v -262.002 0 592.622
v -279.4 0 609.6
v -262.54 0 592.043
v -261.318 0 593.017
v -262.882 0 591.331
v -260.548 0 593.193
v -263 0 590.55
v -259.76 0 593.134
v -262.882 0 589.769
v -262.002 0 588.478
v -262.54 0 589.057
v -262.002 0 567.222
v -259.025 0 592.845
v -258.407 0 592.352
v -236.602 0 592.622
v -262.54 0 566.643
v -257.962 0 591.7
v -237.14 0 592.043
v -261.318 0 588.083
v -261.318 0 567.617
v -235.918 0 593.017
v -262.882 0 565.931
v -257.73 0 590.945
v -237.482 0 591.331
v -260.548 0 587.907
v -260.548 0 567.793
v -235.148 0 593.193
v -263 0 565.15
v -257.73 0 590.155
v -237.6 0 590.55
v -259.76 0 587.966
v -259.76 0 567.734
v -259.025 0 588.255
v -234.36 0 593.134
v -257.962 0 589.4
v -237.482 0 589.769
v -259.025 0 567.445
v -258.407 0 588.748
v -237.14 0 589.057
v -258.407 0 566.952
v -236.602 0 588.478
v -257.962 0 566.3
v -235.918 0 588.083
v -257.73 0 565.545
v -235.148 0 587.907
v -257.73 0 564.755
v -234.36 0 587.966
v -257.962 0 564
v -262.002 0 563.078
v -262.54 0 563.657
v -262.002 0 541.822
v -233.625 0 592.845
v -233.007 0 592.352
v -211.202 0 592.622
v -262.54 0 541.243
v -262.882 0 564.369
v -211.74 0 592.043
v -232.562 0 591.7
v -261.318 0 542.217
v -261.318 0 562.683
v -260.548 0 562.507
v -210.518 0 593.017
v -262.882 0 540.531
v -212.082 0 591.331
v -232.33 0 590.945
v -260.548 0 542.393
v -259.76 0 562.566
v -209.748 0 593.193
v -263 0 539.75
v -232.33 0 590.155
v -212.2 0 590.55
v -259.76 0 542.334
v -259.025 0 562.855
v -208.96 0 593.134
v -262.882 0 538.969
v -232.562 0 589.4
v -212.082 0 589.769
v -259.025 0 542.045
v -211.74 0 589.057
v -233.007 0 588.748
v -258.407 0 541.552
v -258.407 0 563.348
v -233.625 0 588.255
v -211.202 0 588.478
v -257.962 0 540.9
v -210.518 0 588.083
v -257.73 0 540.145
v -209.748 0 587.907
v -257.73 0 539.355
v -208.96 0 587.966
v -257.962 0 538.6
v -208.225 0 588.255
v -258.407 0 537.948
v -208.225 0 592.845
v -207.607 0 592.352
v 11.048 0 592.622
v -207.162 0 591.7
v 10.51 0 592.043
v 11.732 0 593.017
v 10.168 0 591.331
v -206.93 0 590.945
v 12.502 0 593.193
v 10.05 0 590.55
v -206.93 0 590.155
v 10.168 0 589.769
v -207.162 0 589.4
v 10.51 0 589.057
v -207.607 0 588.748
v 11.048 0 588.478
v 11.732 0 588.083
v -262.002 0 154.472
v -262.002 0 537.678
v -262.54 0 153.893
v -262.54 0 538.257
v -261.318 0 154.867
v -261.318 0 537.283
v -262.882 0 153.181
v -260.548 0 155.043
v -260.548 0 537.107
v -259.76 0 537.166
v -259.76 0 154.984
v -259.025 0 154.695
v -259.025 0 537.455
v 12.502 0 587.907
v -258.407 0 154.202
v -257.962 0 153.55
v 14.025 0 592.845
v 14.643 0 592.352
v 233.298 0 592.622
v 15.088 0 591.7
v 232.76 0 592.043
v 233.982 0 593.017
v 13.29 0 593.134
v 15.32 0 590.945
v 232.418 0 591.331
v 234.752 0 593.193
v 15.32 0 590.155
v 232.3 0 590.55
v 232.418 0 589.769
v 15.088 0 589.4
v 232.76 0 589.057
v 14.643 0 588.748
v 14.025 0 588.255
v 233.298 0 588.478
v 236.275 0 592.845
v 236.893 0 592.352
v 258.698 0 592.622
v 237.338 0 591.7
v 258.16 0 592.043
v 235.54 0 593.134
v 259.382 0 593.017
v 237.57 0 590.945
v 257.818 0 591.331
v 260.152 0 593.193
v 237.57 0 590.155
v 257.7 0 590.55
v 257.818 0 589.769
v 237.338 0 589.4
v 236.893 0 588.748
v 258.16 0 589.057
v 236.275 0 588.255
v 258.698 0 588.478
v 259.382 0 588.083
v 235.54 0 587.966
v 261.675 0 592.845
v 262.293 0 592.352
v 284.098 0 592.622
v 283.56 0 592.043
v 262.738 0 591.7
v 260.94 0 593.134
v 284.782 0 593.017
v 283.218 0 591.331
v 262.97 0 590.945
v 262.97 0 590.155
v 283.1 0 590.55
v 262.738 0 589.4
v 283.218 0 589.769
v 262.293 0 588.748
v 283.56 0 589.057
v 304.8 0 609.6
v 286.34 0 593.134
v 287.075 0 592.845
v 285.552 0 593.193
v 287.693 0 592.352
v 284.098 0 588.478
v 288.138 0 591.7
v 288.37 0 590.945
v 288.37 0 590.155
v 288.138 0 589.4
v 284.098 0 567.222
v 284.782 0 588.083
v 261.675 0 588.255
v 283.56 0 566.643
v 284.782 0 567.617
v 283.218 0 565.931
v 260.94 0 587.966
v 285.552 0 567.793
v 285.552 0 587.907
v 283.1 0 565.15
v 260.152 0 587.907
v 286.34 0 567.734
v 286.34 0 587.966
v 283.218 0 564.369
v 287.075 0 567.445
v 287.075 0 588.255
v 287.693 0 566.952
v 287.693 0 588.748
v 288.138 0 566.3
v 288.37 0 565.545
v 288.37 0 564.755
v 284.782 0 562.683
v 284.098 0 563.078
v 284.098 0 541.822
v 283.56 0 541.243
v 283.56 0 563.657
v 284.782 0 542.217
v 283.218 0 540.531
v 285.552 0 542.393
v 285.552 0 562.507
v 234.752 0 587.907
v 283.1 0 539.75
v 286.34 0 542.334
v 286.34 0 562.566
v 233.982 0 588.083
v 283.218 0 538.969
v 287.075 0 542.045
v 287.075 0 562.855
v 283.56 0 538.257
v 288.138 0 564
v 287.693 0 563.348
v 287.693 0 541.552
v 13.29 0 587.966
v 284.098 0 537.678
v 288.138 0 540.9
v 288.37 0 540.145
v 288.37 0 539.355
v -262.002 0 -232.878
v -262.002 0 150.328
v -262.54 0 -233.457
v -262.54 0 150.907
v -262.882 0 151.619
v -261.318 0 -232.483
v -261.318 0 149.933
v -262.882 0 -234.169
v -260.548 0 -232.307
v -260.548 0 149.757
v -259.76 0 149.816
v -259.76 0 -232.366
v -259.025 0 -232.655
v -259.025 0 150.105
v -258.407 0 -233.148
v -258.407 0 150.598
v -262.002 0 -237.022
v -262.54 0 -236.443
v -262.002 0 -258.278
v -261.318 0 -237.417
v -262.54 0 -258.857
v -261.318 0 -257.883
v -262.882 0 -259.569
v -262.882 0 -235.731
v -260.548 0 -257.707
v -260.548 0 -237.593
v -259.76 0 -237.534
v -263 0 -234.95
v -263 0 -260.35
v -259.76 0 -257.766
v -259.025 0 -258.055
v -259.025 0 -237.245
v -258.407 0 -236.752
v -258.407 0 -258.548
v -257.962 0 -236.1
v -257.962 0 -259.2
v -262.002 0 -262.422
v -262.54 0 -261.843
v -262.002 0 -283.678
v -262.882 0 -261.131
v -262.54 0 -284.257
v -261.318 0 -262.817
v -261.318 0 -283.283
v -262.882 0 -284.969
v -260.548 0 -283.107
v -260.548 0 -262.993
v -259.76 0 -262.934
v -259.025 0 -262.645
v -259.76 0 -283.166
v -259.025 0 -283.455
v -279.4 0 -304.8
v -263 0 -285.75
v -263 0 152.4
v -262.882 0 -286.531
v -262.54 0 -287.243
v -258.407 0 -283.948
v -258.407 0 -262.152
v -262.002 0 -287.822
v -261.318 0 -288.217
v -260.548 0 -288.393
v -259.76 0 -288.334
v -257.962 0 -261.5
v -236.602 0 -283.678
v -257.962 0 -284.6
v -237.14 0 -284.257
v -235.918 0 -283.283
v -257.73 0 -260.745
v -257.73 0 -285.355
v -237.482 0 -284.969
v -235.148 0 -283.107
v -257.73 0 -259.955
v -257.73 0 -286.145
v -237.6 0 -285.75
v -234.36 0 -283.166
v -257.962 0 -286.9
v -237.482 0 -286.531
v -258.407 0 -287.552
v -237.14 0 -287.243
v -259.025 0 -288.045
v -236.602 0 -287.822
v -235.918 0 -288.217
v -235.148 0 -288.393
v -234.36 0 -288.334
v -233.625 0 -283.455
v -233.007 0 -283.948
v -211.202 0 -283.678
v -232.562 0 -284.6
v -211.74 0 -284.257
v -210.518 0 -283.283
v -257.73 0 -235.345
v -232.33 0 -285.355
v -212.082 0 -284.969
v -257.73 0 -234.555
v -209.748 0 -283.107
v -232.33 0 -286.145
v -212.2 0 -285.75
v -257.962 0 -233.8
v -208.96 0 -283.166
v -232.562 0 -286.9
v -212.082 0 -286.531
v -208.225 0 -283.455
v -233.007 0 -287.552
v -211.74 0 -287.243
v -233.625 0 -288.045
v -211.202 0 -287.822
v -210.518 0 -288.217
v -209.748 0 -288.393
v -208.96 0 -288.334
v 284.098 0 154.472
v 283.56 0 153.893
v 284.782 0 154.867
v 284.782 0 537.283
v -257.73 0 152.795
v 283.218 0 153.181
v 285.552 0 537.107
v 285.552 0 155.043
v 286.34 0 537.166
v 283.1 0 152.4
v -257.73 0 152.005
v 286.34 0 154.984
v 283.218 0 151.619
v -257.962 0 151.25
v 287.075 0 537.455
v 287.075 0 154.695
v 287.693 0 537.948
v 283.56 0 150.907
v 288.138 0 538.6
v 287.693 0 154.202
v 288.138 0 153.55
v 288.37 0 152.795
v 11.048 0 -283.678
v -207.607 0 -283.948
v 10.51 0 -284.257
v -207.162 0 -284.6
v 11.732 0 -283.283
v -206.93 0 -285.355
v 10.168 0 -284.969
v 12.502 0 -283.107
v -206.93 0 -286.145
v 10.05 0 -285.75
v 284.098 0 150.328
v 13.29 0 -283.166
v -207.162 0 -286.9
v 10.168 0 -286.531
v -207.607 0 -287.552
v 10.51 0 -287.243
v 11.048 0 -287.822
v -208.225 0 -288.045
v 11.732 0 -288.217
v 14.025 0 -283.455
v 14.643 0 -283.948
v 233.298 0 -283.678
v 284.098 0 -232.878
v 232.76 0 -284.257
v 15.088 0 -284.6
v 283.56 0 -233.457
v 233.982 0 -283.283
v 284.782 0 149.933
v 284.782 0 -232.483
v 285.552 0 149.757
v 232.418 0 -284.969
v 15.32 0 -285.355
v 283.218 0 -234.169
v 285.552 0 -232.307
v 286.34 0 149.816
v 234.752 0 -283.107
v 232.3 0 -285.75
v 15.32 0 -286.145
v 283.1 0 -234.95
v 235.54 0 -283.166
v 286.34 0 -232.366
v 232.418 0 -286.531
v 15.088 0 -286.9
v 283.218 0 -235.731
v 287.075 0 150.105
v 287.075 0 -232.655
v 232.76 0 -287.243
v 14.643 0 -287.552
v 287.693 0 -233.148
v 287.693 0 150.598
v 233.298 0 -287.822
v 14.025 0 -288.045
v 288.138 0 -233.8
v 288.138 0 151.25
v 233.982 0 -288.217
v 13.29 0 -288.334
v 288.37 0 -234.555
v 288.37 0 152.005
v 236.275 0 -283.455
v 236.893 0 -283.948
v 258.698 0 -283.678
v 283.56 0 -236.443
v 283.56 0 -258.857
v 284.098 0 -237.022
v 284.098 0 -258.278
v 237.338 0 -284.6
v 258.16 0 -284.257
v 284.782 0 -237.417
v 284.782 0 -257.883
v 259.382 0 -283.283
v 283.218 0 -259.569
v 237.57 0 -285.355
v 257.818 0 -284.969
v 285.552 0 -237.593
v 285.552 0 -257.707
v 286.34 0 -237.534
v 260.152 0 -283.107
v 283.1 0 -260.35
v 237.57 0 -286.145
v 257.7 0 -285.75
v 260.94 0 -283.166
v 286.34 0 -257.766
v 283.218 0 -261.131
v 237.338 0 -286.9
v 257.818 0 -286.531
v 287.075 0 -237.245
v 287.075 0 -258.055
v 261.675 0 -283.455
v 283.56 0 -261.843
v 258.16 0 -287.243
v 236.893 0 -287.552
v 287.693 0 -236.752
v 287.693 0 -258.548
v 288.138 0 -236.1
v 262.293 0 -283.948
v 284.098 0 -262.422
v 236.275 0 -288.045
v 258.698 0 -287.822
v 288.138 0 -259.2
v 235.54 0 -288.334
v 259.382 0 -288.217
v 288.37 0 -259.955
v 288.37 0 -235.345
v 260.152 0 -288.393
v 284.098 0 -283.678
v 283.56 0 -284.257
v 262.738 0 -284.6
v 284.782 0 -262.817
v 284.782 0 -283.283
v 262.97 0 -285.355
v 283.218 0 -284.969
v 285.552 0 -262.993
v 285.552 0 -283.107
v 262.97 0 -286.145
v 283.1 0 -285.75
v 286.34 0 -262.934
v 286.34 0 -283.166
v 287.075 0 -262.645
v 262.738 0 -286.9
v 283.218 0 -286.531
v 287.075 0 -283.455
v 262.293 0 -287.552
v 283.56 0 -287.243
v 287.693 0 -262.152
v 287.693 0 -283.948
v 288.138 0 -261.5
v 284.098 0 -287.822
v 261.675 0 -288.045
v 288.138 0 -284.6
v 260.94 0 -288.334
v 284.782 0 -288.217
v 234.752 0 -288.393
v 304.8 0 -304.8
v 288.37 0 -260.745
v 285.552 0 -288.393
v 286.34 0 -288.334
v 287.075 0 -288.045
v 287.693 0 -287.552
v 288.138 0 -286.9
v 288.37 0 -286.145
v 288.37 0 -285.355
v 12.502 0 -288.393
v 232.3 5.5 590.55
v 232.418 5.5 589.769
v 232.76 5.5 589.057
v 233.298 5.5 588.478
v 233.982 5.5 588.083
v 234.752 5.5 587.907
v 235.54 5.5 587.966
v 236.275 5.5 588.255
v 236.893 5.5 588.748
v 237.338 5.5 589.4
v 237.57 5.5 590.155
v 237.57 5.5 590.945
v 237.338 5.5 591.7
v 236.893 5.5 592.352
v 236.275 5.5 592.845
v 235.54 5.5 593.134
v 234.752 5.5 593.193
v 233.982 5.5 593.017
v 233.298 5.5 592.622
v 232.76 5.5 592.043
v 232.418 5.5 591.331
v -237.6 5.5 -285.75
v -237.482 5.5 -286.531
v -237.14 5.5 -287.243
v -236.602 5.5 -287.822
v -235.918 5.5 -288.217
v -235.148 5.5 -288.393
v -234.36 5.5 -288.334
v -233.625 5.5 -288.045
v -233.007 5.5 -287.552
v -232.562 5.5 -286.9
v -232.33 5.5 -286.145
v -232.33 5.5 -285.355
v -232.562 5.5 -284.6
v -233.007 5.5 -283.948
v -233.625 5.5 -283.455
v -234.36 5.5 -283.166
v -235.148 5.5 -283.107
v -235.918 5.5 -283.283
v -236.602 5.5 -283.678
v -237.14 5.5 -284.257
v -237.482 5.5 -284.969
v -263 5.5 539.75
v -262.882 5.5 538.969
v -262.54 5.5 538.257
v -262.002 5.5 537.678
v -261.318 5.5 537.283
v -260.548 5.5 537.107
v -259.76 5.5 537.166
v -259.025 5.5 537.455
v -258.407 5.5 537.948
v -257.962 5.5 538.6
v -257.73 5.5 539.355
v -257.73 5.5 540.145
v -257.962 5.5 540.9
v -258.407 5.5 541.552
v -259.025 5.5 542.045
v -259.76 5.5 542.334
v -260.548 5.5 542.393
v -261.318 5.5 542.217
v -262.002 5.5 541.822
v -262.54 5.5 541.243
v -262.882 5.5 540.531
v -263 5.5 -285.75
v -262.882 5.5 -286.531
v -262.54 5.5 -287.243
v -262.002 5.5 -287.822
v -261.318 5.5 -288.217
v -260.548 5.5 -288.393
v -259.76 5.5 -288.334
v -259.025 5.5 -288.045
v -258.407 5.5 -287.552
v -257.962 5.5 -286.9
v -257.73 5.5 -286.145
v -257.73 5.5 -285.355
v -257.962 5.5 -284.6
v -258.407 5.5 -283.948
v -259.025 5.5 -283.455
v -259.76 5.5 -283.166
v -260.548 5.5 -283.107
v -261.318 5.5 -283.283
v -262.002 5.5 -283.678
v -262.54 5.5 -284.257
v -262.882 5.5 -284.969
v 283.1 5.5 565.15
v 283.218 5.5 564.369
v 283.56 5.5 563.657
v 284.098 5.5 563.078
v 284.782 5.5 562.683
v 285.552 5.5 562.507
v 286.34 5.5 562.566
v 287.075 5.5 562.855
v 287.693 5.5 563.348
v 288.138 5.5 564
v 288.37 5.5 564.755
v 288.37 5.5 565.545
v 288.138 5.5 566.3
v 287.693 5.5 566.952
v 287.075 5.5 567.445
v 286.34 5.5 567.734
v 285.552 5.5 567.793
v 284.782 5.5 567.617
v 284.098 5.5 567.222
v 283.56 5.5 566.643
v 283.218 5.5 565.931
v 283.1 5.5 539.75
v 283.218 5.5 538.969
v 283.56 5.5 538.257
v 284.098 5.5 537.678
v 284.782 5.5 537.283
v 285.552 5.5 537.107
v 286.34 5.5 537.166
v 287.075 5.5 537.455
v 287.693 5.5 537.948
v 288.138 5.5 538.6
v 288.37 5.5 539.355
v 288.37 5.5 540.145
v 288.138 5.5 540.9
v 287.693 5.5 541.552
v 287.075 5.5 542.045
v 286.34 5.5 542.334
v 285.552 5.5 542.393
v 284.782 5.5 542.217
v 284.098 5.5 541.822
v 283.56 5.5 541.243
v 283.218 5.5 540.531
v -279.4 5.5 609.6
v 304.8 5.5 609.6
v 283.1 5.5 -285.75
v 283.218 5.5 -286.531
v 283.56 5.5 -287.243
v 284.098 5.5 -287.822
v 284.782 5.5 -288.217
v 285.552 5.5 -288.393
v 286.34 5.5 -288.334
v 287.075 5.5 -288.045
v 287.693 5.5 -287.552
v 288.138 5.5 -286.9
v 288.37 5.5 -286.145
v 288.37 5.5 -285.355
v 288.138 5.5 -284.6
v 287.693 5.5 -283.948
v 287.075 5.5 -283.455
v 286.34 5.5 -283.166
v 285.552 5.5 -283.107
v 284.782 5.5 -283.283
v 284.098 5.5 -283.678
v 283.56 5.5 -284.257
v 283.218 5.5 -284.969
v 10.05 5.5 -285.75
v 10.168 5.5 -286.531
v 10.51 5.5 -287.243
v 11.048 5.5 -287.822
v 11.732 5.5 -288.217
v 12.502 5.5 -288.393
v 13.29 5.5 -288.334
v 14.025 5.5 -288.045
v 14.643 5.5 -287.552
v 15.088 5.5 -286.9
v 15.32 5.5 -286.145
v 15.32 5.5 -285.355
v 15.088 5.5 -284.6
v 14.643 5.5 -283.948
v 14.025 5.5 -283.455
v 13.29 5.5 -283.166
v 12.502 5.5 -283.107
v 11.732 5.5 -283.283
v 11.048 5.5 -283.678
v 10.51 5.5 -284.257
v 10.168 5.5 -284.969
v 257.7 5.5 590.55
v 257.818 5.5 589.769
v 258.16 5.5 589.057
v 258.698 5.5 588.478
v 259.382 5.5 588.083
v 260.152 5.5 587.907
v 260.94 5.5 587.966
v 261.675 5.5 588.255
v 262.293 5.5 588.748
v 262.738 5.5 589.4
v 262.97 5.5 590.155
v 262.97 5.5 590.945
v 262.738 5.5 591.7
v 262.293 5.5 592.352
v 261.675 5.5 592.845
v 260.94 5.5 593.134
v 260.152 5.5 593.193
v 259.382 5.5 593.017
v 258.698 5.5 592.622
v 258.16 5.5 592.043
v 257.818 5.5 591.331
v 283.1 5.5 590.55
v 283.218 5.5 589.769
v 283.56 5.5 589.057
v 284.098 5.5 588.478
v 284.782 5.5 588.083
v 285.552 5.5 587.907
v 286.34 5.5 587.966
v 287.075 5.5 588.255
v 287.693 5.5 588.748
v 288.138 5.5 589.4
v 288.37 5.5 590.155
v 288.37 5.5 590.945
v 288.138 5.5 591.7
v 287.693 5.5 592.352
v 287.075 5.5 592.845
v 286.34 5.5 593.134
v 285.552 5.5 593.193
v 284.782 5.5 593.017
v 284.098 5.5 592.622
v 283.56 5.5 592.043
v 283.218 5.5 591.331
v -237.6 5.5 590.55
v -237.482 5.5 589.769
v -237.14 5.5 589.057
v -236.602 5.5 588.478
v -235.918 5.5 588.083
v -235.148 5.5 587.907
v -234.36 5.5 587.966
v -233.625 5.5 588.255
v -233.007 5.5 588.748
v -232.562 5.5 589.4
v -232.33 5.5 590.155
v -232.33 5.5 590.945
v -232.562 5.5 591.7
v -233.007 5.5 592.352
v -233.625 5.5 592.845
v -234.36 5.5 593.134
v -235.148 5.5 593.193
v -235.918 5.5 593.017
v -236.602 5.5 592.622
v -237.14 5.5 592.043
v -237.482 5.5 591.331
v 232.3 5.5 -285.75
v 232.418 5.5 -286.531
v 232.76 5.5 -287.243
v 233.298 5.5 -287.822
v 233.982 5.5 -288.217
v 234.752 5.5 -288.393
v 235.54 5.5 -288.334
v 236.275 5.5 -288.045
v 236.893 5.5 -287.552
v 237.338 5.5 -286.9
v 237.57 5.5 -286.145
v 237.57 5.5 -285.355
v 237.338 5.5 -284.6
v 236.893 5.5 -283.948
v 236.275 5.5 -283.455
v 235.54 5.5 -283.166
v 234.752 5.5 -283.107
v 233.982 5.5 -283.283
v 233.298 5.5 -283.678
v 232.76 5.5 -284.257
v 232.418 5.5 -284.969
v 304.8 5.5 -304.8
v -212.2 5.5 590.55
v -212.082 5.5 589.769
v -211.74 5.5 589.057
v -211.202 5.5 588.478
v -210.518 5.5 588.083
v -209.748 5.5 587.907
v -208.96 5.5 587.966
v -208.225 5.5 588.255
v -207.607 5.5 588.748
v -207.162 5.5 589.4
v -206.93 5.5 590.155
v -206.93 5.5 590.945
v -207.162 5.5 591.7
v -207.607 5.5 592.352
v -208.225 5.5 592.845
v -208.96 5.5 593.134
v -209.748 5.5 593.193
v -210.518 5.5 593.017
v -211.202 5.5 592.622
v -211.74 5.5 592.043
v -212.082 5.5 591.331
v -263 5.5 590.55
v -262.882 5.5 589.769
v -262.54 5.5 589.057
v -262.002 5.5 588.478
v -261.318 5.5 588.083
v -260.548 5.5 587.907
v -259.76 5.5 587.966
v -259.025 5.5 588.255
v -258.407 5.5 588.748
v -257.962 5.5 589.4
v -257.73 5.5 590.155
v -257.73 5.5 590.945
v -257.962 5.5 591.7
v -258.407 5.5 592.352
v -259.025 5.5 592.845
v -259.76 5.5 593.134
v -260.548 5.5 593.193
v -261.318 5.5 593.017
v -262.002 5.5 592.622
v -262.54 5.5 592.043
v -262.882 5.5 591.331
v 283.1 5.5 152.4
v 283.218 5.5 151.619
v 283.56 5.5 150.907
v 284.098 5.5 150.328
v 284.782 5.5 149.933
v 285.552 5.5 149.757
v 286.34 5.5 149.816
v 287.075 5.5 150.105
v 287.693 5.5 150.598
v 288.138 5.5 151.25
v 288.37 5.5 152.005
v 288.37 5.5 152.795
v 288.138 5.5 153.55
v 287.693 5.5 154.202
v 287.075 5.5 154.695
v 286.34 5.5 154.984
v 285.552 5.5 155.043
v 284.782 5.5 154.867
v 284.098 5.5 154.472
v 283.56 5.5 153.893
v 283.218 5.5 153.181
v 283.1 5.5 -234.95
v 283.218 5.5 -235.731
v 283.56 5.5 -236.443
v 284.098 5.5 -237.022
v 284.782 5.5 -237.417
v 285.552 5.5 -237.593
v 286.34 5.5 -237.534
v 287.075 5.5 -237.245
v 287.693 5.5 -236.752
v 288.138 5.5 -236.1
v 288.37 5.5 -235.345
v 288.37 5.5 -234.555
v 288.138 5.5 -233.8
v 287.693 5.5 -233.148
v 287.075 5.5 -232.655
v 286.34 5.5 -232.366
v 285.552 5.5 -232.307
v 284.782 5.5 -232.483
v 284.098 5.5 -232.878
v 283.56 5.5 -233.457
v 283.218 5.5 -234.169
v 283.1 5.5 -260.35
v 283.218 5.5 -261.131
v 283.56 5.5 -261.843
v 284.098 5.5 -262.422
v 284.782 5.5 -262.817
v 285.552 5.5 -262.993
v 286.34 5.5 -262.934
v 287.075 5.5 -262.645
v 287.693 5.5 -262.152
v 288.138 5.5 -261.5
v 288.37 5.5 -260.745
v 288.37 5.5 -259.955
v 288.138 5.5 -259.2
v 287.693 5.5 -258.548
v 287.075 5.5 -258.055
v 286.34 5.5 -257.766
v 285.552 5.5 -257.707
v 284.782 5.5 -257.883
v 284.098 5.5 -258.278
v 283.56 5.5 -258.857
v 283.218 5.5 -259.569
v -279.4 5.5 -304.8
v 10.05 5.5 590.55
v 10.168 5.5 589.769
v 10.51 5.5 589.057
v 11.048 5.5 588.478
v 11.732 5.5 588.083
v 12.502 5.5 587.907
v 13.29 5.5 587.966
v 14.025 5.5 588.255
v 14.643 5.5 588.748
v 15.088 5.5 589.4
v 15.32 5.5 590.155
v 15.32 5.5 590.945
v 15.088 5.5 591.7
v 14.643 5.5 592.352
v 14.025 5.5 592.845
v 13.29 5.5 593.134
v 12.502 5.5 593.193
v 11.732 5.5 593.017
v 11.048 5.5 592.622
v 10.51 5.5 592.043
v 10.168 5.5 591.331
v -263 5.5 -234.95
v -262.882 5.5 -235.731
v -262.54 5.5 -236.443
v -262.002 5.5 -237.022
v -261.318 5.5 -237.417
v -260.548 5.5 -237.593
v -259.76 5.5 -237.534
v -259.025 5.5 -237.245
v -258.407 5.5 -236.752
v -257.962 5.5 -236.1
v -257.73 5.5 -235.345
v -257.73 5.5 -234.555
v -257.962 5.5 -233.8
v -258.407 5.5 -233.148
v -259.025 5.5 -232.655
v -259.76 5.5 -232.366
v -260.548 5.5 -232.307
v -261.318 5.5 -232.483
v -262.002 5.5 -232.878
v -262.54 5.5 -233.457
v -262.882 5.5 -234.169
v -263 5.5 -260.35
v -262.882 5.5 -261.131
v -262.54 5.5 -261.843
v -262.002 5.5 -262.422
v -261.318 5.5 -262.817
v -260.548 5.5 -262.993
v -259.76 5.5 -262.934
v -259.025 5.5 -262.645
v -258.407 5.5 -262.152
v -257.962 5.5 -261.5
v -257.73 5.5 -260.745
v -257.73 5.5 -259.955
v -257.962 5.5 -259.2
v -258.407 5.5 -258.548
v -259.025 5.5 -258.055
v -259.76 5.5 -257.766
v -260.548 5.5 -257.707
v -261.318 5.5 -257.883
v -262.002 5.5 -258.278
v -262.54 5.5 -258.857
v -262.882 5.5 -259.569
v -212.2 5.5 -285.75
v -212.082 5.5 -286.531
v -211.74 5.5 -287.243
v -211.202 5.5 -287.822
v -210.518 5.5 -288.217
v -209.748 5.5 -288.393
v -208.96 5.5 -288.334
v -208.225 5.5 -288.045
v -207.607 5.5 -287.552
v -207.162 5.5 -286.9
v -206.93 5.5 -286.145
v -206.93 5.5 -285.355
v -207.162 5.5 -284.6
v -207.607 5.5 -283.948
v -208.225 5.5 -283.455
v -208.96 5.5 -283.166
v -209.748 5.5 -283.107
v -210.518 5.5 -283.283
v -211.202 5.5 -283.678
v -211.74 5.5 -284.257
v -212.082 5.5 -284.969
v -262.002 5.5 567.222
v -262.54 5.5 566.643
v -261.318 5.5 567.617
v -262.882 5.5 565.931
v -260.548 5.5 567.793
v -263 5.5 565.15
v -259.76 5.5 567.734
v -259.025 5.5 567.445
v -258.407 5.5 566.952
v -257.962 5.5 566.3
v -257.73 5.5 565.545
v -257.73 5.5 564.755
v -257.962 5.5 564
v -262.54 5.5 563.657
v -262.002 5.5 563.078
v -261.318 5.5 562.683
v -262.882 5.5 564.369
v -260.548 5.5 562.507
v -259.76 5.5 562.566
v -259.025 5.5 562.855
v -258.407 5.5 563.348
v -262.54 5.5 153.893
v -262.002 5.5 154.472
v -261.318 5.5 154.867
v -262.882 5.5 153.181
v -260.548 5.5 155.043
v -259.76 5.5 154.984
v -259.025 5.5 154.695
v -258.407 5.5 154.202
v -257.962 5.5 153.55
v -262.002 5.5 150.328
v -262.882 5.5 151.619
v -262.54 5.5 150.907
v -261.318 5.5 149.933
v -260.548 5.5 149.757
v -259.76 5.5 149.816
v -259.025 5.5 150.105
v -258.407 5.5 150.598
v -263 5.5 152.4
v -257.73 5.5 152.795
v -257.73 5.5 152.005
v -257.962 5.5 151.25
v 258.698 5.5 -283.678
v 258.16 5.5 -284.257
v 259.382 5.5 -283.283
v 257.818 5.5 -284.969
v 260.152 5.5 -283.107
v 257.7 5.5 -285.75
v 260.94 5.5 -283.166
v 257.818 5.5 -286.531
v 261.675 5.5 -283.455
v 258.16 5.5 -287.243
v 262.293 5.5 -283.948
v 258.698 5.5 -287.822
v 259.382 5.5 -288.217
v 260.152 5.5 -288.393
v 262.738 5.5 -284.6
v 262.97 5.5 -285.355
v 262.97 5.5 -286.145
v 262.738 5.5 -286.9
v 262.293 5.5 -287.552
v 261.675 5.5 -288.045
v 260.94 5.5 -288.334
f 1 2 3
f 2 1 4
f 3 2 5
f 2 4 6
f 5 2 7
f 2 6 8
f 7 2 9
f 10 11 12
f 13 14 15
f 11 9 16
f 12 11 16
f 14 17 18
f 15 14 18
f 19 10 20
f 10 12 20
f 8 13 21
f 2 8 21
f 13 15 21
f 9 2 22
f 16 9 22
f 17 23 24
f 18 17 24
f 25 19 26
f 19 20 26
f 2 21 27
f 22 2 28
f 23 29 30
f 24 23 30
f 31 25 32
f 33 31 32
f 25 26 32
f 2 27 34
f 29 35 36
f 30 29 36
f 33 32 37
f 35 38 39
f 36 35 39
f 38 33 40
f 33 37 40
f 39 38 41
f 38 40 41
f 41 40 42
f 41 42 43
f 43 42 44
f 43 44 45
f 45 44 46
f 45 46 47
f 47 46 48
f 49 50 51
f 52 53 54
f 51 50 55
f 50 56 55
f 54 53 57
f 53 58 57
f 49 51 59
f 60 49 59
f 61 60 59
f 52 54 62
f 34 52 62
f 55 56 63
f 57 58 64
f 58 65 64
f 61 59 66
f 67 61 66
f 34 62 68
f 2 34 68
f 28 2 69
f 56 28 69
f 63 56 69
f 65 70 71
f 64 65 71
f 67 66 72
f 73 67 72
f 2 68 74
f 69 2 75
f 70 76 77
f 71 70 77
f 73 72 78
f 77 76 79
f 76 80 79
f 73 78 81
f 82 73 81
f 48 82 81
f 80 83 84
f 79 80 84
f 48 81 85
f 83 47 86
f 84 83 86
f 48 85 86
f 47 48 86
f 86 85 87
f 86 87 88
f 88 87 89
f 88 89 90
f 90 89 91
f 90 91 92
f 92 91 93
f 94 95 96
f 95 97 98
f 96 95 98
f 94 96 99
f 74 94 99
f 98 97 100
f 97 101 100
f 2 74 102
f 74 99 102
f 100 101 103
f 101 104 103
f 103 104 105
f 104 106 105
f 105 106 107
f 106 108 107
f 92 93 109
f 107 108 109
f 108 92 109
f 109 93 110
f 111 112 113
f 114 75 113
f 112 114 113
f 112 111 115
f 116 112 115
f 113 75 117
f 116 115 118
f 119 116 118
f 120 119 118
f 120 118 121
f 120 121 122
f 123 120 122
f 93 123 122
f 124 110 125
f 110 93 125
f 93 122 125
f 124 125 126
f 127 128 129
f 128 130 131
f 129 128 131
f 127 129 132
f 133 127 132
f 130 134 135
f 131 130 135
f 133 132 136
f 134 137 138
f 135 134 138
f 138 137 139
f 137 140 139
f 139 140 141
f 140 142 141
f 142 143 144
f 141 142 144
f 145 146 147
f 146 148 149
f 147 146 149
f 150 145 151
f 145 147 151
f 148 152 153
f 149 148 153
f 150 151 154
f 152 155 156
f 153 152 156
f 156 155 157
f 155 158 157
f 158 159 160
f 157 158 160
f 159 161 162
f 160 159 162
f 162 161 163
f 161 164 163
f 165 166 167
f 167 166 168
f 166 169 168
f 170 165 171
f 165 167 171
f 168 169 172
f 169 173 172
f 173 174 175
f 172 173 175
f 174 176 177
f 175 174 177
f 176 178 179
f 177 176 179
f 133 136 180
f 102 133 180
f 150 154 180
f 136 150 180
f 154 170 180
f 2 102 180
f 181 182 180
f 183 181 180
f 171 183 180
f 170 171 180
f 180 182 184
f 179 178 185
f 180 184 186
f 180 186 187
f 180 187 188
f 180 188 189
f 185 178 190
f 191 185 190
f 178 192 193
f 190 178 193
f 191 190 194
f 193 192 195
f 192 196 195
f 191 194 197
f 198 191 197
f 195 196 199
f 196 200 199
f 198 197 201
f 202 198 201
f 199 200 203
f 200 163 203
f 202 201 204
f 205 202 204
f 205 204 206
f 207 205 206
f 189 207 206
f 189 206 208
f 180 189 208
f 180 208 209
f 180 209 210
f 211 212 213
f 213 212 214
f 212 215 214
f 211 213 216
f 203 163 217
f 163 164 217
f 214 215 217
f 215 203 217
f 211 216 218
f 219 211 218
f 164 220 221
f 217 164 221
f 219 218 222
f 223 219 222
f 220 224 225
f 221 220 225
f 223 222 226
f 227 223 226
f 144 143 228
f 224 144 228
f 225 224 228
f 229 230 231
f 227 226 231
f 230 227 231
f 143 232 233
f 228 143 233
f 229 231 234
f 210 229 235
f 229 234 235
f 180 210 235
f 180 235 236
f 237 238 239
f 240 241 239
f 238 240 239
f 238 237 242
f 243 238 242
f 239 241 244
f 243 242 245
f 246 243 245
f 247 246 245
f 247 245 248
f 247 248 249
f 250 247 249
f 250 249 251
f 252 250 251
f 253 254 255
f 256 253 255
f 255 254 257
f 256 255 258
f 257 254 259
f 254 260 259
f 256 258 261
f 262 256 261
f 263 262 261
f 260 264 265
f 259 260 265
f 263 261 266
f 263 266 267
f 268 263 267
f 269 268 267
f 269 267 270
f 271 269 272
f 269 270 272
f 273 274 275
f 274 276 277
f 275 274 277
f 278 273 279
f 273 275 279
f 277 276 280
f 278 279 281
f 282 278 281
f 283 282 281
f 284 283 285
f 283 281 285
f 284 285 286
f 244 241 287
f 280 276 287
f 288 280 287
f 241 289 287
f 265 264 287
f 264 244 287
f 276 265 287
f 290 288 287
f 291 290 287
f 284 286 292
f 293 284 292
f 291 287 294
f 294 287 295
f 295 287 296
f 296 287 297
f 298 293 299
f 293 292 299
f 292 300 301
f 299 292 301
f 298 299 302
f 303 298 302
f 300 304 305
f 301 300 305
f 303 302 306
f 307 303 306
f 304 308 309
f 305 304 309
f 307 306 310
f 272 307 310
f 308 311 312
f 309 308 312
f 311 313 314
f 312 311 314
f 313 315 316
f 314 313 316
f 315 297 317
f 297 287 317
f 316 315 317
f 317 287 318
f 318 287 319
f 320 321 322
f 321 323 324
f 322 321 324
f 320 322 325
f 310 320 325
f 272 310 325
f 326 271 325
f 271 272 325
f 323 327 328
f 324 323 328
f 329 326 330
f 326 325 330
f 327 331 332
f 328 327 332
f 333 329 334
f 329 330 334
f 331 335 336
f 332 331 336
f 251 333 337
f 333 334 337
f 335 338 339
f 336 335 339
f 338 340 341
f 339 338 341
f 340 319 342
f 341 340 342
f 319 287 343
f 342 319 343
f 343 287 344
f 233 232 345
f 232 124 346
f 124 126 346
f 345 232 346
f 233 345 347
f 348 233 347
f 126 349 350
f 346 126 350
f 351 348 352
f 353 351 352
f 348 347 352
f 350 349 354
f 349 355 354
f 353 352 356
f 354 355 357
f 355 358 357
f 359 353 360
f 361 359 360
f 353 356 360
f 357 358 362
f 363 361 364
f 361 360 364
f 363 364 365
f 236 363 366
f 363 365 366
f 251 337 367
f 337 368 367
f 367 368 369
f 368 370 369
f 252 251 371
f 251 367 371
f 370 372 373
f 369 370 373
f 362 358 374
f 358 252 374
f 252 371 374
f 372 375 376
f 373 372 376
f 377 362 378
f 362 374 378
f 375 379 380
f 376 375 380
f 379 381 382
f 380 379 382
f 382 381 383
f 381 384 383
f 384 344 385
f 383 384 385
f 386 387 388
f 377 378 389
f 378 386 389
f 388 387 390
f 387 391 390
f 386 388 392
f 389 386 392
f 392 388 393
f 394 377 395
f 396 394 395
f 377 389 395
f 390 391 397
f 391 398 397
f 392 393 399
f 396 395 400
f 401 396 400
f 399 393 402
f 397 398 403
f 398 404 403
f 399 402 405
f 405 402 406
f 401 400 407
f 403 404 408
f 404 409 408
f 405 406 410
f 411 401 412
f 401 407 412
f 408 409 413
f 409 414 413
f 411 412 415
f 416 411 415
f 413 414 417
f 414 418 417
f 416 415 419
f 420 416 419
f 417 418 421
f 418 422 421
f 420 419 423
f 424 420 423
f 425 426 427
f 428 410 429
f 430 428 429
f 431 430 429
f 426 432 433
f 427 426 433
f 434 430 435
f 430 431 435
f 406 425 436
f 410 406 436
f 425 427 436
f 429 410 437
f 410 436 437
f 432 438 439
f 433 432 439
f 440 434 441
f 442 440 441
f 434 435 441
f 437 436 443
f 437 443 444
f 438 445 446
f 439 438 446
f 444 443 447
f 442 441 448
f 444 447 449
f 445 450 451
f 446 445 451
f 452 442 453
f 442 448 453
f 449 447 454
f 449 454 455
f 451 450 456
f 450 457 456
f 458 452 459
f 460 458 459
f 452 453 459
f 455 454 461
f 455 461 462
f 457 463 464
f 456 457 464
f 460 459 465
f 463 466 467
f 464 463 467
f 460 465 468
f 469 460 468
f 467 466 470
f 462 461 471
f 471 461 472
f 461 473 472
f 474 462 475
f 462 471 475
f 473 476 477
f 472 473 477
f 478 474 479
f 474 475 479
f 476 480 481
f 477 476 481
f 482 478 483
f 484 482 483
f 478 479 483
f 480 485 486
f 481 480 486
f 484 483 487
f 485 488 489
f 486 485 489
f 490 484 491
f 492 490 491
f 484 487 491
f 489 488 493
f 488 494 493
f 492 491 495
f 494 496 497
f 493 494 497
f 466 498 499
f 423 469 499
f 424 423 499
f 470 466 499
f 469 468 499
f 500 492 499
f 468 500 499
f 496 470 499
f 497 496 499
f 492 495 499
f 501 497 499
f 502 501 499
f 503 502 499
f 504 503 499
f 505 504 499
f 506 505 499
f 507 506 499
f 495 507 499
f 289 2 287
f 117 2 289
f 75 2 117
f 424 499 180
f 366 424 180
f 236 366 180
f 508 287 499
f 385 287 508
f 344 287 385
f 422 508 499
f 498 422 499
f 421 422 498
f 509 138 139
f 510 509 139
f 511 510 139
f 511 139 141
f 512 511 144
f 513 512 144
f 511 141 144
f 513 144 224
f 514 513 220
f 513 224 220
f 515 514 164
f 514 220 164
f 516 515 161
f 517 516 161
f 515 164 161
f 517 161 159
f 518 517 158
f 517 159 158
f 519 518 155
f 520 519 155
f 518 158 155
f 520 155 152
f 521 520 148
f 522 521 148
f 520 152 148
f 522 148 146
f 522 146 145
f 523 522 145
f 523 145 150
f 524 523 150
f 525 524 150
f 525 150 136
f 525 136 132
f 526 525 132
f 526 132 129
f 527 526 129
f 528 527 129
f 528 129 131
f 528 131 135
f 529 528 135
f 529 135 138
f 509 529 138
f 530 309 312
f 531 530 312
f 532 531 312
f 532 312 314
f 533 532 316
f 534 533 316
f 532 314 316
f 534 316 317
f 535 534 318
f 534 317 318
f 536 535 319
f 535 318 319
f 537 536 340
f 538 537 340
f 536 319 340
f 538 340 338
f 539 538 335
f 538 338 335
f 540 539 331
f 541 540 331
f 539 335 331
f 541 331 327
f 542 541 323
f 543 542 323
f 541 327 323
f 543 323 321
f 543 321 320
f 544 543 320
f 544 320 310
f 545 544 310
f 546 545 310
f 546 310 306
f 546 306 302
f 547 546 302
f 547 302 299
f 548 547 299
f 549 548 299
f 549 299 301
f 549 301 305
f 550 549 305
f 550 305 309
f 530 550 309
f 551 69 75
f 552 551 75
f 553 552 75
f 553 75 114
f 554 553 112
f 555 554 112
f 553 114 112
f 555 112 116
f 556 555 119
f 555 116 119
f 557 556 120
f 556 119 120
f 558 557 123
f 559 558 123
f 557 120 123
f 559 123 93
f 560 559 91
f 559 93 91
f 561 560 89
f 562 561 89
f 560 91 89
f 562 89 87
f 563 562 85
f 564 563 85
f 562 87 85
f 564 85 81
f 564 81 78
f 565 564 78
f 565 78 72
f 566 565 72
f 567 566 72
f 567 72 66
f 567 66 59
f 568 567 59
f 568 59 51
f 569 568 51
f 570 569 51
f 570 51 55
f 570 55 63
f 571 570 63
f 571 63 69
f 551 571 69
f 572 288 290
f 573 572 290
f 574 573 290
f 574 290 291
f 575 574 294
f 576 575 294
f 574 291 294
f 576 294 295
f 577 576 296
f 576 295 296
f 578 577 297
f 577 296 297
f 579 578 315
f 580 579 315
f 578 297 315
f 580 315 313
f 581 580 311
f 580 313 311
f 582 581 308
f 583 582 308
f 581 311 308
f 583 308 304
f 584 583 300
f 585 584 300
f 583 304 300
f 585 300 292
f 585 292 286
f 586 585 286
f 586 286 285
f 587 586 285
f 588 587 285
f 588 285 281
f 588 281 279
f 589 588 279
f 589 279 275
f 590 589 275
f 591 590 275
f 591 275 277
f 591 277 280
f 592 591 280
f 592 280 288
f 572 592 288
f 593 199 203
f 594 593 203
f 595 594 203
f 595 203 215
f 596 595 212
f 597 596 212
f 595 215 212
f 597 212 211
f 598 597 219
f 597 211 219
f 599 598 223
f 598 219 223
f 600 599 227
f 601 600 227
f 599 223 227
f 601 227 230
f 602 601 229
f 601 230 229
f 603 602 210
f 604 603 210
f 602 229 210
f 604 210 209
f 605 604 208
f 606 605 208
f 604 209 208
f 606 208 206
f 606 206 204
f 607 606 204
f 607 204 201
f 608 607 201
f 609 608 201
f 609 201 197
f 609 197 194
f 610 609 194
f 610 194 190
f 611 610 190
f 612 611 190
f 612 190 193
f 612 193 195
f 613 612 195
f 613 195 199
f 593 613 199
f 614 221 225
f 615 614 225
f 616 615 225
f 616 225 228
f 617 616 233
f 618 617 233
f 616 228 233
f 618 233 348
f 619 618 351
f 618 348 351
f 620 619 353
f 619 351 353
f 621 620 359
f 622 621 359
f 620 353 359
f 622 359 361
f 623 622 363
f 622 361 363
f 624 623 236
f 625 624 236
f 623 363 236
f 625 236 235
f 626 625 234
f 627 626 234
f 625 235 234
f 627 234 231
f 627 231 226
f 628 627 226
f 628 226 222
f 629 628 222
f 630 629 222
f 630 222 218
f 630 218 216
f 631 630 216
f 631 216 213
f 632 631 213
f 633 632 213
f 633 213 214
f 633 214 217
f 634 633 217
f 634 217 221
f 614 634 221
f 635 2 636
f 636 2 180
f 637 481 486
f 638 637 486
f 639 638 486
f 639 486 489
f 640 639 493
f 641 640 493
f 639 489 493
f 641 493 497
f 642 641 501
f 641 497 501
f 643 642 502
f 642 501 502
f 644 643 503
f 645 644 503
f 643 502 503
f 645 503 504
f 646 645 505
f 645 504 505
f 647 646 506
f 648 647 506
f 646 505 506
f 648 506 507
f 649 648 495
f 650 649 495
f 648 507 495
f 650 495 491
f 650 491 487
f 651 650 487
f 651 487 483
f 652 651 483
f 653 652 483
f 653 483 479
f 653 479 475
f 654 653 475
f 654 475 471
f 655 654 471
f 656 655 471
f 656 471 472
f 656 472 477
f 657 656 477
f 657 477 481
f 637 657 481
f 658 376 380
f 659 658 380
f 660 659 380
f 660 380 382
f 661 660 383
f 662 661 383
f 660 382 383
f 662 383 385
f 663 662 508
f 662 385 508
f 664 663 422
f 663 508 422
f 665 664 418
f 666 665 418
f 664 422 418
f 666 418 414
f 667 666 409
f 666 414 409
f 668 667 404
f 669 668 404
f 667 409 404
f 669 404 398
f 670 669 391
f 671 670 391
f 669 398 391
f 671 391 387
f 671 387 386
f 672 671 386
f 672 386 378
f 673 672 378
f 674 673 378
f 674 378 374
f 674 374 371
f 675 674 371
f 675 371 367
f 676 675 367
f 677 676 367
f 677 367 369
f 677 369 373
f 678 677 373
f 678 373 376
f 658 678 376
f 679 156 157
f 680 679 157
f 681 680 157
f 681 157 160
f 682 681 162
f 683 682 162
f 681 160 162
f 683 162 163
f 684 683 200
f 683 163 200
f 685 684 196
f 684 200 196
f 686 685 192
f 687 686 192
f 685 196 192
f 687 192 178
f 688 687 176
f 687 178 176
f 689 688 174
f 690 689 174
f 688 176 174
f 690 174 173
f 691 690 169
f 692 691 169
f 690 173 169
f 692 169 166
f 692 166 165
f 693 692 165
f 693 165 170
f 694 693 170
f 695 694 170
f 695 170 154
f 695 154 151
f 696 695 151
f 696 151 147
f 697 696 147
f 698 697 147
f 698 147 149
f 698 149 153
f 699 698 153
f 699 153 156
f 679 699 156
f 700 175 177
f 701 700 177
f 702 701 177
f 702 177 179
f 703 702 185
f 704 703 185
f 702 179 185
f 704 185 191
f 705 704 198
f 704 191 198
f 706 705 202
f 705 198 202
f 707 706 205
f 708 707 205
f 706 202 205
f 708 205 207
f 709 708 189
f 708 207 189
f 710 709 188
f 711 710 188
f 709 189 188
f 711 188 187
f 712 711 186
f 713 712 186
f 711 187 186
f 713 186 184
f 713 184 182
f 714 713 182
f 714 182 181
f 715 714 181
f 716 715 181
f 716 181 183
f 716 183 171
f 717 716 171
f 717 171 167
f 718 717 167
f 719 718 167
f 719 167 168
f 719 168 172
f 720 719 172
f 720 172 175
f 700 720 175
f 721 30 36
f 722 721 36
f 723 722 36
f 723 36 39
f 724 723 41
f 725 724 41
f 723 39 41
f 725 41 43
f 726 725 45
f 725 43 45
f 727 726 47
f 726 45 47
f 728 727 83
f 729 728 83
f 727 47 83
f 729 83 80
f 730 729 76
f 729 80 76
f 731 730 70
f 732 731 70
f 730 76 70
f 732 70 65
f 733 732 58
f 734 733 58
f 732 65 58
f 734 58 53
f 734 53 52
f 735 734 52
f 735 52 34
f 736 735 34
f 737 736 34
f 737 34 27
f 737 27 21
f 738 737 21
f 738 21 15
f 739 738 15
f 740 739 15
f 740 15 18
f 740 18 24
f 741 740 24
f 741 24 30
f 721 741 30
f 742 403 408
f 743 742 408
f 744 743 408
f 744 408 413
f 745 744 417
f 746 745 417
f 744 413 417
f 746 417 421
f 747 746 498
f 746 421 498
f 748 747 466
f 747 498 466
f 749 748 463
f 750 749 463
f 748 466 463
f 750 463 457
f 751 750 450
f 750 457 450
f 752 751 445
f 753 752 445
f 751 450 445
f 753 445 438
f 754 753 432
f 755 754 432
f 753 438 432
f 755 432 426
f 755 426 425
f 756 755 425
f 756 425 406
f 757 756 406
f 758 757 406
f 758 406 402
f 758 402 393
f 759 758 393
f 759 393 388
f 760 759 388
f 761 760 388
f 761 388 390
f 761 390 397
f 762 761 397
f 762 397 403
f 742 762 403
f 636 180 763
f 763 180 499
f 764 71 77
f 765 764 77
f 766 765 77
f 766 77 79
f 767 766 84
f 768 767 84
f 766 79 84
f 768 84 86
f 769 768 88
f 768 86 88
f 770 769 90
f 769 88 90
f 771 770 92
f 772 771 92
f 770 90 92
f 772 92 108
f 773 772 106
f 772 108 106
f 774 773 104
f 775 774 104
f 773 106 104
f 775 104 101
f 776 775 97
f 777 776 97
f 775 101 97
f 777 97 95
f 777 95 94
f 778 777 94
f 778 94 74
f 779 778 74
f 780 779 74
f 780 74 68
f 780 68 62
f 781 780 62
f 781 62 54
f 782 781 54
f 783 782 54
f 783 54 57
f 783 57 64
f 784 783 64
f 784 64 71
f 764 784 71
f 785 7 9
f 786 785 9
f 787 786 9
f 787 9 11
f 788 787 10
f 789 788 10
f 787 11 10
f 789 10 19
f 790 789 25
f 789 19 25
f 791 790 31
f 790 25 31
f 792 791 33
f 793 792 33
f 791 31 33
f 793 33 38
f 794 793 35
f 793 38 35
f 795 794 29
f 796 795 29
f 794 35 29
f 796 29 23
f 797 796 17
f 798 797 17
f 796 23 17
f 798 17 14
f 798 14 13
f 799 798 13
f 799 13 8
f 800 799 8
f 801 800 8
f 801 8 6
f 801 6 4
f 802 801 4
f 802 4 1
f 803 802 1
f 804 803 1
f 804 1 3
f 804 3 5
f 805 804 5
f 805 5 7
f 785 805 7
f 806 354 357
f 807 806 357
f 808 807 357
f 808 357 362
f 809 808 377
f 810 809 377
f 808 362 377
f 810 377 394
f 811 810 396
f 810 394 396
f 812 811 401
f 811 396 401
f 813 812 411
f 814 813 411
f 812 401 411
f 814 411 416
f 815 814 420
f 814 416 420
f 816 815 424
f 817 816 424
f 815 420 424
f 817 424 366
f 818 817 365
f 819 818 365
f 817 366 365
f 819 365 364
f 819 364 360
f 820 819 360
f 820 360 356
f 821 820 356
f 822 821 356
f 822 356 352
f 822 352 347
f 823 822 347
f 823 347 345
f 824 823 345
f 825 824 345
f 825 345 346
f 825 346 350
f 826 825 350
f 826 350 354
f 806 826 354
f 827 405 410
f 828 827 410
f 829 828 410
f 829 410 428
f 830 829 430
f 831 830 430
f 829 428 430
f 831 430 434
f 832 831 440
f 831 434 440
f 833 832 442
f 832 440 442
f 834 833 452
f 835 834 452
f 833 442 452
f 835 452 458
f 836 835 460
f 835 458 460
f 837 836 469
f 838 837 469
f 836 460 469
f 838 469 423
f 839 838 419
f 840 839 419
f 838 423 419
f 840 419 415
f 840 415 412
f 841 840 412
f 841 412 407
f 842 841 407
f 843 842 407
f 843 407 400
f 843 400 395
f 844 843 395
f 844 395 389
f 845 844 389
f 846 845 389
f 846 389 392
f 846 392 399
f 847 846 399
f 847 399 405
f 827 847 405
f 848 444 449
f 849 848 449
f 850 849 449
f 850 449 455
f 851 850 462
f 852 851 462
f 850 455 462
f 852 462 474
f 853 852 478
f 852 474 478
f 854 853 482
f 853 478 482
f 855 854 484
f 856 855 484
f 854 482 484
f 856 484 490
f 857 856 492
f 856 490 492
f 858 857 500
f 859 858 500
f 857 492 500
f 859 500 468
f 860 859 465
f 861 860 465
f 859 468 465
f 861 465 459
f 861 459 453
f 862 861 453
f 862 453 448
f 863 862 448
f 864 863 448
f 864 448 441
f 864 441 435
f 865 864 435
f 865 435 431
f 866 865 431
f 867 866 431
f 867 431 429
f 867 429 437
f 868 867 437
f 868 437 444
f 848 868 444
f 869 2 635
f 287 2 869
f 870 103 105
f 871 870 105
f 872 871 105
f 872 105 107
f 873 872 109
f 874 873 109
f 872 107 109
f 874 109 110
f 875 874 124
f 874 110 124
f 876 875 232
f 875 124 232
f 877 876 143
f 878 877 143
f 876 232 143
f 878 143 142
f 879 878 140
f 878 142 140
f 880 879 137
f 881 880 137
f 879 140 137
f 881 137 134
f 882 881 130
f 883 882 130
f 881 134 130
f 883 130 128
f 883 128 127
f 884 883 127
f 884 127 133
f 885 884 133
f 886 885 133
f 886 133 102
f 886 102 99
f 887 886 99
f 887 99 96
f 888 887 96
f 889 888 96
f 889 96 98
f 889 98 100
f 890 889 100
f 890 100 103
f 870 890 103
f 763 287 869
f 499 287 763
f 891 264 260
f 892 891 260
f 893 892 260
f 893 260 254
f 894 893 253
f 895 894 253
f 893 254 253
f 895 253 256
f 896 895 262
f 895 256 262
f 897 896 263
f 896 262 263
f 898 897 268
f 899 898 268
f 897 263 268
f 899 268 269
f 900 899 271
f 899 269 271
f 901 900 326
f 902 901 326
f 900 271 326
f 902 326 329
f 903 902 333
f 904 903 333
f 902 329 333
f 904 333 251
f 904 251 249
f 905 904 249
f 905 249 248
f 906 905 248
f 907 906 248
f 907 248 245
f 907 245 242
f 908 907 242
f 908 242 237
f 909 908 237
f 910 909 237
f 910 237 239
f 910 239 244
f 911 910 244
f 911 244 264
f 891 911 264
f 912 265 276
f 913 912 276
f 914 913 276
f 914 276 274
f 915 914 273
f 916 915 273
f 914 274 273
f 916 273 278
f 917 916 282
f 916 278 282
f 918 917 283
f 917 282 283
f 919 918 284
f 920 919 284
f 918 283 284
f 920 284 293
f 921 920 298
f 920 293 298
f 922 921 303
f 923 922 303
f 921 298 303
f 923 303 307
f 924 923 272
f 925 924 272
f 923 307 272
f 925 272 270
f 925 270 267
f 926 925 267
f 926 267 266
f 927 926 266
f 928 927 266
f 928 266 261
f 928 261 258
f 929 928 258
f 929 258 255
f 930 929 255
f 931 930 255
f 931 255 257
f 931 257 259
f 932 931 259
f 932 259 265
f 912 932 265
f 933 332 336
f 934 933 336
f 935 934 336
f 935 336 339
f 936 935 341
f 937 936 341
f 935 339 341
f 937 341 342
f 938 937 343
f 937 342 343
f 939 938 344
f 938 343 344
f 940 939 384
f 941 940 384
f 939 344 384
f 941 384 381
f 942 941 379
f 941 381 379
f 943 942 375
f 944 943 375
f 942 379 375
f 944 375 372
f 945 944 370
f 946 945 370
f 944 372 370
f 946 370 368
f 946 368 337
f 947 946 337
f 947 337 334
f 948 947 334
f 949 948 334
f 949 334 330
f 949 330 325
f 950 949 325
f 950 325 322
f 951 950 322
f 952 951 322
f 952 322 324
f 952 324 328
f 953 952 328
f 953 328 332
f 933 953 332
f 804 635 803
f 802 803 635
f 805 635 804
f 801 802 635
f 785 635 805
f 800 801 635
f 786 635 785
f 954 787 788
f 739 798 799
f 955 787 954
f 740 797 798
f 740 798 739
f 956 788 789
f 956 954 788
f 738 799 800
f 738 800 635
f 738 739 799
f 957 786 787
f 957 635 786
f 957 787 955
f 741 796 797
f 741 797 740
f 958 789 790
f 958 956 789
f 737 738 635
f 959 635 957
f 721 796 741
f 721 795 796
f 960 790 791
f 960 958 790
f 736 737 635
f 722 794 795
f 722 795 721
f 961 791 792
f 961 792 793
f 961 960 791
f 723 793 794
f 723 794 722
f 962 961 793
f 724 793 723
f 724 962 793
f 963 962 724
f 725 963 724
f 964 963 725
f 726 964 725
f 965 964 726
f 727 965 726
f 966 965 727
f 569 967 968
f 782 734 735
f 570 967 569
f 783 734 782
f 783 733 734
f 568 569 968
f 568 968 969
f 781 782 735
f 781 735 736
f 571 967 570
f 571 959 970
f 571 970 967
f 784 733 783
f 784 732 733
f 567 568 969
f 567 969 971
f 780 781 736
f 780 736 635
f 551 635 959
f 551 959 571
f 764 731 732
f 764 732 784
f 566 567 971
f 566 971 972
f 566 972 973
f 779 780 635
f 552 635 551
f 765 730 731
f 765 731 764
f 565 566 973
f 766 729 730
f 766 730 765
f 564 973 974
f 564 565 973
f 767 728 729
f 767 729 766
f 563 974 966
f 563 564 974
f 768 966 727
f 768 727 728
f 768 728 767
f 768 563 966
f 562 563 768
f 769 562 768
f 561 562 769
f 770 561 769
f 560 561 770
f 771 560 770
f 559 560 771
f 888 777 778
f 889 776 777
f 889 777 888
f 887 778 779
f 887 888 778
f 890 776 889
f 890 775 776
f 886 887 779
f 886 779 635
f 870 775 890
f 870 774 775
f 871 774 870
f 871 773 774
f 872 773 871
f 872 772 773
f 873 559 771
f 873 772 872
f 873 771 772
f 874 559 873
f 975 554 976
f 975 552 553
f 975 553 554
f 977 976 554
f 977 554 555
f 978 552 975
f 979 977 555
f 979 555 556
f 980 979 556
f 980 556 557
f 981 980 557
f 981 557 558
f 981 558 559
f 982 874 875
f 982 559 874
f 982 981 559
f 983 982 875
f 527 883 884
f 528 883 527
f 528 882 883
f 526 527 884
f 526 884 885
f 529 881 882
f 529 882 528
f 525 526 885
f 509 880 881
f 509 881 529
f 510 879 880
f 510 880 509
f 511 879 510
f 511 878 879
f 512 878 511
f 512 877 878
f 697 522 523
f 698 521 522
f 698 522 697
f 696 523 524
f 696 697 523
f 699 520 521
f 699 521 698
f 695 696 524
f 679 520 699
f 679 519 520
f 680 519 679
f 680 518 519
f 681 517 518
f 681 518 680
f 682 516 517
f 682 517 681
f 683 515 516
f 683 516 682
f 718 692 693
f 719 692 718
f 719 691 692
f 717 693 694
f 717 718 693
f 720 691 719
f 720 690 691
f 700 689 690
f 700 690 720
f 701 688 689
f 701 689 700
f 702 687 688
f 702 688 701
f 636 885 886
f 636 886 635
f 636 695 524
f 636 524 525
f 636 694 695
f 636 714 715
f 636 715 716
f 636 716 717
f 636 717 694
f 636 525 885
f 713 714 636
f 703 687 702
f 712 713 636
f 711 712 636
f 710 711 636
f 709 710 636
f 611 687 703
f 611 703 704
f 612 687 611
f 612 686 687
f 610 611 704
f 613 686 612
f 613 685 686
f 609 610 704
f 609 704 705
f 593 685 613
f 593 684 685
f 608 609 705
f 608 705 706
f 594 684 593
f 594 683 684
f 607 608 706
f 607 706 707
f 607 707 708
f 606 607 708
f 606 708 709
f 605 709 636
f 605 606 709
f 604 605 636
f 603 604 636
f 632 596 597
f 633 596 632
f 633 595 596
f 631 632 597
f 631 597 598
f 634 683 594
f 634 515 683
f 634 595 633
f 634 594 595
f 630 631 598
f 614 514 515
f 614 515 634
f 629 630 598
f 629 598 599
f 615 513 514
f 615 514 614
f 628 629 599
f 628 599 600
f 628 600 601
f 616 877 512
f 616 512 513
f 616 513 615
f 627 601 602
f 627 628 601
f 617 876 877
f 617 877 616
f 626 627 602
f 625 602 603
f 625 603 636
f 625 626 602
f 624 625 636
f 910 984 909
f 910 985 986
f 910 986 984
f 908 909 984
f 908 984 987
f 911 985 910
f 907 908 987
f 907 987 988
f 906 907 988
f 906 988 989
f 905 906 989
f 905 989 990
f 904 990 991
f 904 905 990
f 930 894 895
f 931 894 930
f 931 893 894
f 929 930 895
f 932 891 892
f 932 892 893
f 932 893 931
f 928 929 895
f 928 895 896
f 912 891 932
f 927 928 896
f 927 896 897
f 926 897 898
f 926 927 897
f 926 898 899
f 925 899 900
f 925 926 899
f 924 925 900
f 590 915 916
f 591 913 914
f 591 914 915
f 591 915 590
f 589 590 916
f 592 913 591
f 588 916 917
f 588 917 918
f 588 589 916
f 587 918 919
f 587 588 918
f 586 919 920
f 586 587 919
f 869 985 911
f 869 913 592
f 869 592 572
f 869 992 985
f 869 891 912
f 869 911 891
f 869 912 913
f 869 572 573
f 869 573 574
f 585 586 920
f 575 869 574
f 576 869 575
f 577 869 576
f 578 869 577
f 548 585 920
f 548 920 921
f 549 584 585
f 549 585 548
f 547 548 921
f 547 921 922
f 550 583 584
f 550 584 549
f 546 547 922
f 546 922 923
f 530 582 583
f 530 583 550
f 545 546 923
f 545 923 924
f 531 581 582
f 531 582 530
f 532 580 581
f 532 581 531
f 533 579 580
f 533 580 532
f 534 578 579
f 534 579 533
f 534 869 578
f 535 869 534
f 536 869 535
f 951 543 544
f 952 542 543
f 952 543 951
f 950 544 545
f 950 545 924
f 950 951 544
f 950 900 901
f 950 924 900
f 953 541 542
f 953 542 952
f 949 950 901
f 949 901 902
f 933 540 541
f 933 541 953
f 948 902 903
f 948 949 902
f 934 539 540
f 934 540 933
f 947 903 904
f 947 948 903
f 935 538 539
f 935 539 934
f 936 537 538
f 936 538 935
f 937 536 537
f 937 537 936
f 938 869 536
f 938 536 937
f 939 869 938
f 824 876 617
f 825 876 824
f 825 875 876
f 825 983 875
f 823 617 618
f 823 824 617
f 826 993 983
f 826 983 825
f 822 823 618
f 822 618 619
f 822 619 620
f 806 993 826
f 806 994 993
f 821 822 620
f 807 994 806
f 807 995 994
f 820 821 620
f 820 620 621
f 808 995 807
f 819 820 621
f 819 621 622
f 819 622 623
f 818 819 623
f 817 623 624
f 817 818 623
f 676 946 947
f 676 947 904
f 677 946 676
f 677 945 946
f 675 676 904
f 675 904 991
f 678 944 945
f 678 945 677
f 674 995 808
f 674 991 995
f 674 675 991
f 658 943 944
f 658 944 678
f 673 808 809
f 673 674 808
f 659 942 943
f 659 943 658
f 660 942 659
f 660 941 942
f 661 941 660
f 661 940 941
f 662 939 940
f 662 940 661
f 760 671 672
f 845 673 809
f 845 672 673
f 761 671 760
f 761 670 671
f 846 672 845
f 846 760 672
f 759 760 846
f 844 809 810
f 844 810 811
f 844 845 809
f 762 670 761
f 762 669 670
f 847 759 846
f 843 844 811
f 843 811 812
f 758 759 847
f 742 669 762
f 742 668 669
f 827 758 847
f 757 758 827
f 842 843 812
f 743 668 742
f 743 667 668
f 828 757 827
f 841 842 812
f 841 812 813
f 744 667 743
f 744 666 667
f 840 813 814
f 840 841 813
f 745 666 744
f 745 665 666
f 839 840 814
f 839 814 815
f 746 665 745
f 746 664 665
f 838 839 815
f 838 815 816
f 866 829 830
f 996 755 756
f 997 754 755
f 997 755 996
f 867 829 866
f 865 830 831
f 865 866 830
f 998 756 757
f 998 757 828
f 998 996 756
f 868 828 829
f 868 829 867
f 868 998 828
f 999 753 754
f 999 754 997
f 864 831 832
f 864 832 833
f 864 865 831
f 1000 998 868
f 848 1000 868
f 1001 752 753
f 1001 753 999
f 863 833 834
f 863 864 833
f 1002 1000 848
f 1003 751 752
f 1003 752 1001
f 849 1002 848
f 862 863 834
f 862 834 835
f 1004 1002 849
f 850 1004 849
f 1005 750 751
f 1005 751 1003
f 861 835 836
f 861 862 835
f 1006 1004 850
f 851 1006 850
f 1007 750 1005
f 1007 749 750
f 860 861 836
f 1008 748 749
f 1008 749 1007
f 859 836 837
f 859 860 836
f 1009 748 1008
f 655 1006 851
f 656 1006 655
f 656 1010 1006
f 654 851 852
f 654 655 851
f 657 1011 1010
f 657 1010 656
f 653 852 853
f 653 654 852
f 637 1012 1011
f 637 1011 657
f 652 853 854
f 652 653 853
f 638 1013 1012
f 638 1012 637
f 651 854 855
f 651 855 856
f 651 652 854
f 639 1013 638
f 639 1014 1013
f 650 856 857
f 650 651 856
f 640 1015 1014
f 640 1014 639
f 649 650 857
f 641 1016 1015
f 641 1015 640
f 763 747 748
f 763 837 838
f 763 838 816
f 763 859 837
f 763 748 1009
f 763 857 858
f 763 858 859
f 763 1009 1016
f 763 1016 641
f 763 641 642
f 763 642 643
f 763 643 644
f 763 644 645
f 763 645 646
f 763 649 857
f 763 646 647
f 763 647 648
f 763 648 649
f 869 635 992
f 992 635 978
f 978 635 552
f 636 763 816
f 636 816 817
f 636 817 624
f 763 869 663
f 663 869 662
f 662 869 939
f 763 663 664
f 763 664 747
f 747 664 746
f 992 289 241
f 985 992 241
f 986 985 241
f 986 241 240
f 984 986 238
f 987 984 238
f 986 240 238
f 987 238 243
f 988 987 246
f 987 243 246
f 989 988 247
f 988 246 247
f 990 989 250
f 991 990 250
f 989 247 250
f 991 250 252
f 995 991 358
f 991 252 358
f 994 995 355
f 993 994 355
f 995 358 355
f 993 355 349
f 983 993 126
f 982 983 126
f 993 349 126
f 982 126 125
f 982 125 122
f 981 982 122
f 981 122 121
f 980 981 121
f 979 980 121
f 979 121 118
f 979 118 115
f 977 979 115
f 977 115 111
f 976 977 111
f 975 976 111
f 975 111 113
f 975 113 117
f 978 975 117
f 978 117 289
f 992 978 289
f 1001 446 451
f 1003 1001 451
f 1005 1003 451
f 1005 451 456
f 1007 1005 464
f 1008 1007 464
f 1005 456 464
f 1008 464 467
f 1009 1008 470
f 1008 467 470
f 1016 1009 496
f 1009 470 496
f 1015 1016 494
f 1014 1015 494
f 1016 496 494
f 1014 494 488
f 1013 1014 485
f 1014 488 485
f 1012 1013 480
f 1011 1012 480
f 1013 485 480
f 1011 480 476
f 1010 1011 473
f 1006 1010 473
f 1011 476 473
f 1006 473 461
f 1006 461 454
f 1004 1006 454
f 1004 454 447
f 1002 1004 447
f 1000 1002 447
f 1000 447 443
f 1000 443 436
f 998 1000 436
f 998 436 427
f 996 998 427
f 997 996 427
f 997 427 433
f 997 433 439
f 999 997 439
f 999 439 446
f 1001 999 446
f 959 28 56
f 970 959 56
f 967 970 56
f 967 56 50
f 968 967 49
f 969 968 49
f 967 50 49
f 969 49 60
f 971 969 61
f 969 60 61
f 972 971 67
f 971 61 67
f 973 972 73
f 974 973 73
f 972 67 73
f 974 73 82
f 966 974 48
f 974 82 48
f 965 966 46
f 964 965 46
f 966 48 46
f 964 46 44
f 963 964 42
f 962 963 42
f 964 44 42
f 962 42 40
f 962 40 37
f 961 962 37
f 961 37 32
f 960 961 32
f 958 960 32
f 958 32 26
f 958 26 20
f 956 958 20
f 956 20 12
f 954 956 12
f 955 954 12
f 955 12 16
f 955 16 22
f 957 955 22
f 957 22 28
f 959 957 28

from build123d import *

# Parameters (mm, degrees)
SKETCH1_W                  = 609.6
SKETCH1_H                  = 1219.2
BOSS_EXTRUDE1_DEPTH        = 5.5
SKETCH2_W                  = 584.2
SKETCH2_H                  = 2.54
EXTRUDE_THIN1_DEPTH        = 25.4
SKETCH2_3_W                = 2.54
SKETCH2_3_H                = 1219.2
SKETCH2_3_W_2              = 584.2
SKETCH2_3_H_2              = 2.54
EXTRUDE_THIN2_DEPTH        = 25.4
F_5_3_5_3_DIAMETER_HOLE1_D = 5.3
CUT_EXTRUDE1_REACH         = 684.254


with BuildPart() as part:
    # Sketch1 → Boss-Extrude1 (new body)
    with BuildSketch(Plane(origin=(0, 0, 0), x_dir=(1, 0, 0), z_dir=(0, 1, 0))):
        Rectangle(SKETCH1_W, SKETCH1_H)
    extrude(amount=BOSS_EXTRUDE1_DEPTH)

    # Sketch2 → Extrude-Thin1 (add)
    with BuildSketch(Plane(origin=(0, 5.5, 0), x_dir=(1, 0, 0), z_dir=(0, 1, 0))):
        with Locations((12.7, 306.07)):
            Rectangle(SKETCH2_W, SKETCH2_H)
    extrude(amount=EXTRUDE_THIN1_DEPTH)

    # Sketch2<3> → Extrude-Thin2 (add)
    with BuildSketch(Plane(origin=(0, 5.5, 0), x_dir=(1, 0, 0), z_dir=(0, 1, 0))):
        with Locations((-280.67, 0)):
            Rectangle(SKETCH2_3_W, SKETCH2_3_H)
        with Locations((12.7, 306.07)):
            Rectangle(SKETCH2_3_W_2, SKETCH2_3_H_2)
    extrude(amount=EXTRUDE_THIN2_DEPTH)

    # Ø5.3 (5.3) Diameter Hole1 (through all)
    with Locations(Plane(origin=(0, 5.5, 0), x_dir=(1, 0, 0), z_dir=(0, 1, 0))):
        with Locations((-260.35, 285.75), (-234.95, 285.75), (-209.55, 285.75), (-260.35, 260.35), (-260.35, 234.95), (12.7, 285.75), (234.95, 285.75), (260.35, 285.75), (285.75, 285.75), (285.75, 260.35), (285.75, 234.95), (-260.35, -152.4), (285.75, -152.4), (-260.35, -539.75), (-260.35, -565.15), (-260.35, -590.55), (-234.95, -590.55), (-209.55, -590.55), (12.7, -590.55), (234.95, -590.55), (260.35, -590.55), (285.75, -590.55), (285.75, -565.15), (285.75, -539.75)):
            Hole(F_5_3_5_3_DIAMETER_HOLE1_D / 2)

    # Sketch6 → Cut-Extrude1 (cut, up to next)
    with BuildSketch(Plane.XZ, mode=Mode.PRIVATE) as cut_extrude1_sk1:
        Polygon((-304.8, 609.6), (-279.4, 609.6), (-279.4, -304.8), (304.8, -304.8), (304.8, -609.6), (-279.4, -609.6), (-304.8, -609.6), align=None)
    cut_extrude1_tool1 = extrude(cut_extrude1_sk1.sketch, amount=-CUT_EXTRUDE1_REACH, mode=Mode.PRIVATE) & part.part
    add(cut_extrude1_tool1.solids().sort_by_distance((-32.455556, 0, -389.466667))[0], mode=Mode.SUBTRACT)


solid = part.part
